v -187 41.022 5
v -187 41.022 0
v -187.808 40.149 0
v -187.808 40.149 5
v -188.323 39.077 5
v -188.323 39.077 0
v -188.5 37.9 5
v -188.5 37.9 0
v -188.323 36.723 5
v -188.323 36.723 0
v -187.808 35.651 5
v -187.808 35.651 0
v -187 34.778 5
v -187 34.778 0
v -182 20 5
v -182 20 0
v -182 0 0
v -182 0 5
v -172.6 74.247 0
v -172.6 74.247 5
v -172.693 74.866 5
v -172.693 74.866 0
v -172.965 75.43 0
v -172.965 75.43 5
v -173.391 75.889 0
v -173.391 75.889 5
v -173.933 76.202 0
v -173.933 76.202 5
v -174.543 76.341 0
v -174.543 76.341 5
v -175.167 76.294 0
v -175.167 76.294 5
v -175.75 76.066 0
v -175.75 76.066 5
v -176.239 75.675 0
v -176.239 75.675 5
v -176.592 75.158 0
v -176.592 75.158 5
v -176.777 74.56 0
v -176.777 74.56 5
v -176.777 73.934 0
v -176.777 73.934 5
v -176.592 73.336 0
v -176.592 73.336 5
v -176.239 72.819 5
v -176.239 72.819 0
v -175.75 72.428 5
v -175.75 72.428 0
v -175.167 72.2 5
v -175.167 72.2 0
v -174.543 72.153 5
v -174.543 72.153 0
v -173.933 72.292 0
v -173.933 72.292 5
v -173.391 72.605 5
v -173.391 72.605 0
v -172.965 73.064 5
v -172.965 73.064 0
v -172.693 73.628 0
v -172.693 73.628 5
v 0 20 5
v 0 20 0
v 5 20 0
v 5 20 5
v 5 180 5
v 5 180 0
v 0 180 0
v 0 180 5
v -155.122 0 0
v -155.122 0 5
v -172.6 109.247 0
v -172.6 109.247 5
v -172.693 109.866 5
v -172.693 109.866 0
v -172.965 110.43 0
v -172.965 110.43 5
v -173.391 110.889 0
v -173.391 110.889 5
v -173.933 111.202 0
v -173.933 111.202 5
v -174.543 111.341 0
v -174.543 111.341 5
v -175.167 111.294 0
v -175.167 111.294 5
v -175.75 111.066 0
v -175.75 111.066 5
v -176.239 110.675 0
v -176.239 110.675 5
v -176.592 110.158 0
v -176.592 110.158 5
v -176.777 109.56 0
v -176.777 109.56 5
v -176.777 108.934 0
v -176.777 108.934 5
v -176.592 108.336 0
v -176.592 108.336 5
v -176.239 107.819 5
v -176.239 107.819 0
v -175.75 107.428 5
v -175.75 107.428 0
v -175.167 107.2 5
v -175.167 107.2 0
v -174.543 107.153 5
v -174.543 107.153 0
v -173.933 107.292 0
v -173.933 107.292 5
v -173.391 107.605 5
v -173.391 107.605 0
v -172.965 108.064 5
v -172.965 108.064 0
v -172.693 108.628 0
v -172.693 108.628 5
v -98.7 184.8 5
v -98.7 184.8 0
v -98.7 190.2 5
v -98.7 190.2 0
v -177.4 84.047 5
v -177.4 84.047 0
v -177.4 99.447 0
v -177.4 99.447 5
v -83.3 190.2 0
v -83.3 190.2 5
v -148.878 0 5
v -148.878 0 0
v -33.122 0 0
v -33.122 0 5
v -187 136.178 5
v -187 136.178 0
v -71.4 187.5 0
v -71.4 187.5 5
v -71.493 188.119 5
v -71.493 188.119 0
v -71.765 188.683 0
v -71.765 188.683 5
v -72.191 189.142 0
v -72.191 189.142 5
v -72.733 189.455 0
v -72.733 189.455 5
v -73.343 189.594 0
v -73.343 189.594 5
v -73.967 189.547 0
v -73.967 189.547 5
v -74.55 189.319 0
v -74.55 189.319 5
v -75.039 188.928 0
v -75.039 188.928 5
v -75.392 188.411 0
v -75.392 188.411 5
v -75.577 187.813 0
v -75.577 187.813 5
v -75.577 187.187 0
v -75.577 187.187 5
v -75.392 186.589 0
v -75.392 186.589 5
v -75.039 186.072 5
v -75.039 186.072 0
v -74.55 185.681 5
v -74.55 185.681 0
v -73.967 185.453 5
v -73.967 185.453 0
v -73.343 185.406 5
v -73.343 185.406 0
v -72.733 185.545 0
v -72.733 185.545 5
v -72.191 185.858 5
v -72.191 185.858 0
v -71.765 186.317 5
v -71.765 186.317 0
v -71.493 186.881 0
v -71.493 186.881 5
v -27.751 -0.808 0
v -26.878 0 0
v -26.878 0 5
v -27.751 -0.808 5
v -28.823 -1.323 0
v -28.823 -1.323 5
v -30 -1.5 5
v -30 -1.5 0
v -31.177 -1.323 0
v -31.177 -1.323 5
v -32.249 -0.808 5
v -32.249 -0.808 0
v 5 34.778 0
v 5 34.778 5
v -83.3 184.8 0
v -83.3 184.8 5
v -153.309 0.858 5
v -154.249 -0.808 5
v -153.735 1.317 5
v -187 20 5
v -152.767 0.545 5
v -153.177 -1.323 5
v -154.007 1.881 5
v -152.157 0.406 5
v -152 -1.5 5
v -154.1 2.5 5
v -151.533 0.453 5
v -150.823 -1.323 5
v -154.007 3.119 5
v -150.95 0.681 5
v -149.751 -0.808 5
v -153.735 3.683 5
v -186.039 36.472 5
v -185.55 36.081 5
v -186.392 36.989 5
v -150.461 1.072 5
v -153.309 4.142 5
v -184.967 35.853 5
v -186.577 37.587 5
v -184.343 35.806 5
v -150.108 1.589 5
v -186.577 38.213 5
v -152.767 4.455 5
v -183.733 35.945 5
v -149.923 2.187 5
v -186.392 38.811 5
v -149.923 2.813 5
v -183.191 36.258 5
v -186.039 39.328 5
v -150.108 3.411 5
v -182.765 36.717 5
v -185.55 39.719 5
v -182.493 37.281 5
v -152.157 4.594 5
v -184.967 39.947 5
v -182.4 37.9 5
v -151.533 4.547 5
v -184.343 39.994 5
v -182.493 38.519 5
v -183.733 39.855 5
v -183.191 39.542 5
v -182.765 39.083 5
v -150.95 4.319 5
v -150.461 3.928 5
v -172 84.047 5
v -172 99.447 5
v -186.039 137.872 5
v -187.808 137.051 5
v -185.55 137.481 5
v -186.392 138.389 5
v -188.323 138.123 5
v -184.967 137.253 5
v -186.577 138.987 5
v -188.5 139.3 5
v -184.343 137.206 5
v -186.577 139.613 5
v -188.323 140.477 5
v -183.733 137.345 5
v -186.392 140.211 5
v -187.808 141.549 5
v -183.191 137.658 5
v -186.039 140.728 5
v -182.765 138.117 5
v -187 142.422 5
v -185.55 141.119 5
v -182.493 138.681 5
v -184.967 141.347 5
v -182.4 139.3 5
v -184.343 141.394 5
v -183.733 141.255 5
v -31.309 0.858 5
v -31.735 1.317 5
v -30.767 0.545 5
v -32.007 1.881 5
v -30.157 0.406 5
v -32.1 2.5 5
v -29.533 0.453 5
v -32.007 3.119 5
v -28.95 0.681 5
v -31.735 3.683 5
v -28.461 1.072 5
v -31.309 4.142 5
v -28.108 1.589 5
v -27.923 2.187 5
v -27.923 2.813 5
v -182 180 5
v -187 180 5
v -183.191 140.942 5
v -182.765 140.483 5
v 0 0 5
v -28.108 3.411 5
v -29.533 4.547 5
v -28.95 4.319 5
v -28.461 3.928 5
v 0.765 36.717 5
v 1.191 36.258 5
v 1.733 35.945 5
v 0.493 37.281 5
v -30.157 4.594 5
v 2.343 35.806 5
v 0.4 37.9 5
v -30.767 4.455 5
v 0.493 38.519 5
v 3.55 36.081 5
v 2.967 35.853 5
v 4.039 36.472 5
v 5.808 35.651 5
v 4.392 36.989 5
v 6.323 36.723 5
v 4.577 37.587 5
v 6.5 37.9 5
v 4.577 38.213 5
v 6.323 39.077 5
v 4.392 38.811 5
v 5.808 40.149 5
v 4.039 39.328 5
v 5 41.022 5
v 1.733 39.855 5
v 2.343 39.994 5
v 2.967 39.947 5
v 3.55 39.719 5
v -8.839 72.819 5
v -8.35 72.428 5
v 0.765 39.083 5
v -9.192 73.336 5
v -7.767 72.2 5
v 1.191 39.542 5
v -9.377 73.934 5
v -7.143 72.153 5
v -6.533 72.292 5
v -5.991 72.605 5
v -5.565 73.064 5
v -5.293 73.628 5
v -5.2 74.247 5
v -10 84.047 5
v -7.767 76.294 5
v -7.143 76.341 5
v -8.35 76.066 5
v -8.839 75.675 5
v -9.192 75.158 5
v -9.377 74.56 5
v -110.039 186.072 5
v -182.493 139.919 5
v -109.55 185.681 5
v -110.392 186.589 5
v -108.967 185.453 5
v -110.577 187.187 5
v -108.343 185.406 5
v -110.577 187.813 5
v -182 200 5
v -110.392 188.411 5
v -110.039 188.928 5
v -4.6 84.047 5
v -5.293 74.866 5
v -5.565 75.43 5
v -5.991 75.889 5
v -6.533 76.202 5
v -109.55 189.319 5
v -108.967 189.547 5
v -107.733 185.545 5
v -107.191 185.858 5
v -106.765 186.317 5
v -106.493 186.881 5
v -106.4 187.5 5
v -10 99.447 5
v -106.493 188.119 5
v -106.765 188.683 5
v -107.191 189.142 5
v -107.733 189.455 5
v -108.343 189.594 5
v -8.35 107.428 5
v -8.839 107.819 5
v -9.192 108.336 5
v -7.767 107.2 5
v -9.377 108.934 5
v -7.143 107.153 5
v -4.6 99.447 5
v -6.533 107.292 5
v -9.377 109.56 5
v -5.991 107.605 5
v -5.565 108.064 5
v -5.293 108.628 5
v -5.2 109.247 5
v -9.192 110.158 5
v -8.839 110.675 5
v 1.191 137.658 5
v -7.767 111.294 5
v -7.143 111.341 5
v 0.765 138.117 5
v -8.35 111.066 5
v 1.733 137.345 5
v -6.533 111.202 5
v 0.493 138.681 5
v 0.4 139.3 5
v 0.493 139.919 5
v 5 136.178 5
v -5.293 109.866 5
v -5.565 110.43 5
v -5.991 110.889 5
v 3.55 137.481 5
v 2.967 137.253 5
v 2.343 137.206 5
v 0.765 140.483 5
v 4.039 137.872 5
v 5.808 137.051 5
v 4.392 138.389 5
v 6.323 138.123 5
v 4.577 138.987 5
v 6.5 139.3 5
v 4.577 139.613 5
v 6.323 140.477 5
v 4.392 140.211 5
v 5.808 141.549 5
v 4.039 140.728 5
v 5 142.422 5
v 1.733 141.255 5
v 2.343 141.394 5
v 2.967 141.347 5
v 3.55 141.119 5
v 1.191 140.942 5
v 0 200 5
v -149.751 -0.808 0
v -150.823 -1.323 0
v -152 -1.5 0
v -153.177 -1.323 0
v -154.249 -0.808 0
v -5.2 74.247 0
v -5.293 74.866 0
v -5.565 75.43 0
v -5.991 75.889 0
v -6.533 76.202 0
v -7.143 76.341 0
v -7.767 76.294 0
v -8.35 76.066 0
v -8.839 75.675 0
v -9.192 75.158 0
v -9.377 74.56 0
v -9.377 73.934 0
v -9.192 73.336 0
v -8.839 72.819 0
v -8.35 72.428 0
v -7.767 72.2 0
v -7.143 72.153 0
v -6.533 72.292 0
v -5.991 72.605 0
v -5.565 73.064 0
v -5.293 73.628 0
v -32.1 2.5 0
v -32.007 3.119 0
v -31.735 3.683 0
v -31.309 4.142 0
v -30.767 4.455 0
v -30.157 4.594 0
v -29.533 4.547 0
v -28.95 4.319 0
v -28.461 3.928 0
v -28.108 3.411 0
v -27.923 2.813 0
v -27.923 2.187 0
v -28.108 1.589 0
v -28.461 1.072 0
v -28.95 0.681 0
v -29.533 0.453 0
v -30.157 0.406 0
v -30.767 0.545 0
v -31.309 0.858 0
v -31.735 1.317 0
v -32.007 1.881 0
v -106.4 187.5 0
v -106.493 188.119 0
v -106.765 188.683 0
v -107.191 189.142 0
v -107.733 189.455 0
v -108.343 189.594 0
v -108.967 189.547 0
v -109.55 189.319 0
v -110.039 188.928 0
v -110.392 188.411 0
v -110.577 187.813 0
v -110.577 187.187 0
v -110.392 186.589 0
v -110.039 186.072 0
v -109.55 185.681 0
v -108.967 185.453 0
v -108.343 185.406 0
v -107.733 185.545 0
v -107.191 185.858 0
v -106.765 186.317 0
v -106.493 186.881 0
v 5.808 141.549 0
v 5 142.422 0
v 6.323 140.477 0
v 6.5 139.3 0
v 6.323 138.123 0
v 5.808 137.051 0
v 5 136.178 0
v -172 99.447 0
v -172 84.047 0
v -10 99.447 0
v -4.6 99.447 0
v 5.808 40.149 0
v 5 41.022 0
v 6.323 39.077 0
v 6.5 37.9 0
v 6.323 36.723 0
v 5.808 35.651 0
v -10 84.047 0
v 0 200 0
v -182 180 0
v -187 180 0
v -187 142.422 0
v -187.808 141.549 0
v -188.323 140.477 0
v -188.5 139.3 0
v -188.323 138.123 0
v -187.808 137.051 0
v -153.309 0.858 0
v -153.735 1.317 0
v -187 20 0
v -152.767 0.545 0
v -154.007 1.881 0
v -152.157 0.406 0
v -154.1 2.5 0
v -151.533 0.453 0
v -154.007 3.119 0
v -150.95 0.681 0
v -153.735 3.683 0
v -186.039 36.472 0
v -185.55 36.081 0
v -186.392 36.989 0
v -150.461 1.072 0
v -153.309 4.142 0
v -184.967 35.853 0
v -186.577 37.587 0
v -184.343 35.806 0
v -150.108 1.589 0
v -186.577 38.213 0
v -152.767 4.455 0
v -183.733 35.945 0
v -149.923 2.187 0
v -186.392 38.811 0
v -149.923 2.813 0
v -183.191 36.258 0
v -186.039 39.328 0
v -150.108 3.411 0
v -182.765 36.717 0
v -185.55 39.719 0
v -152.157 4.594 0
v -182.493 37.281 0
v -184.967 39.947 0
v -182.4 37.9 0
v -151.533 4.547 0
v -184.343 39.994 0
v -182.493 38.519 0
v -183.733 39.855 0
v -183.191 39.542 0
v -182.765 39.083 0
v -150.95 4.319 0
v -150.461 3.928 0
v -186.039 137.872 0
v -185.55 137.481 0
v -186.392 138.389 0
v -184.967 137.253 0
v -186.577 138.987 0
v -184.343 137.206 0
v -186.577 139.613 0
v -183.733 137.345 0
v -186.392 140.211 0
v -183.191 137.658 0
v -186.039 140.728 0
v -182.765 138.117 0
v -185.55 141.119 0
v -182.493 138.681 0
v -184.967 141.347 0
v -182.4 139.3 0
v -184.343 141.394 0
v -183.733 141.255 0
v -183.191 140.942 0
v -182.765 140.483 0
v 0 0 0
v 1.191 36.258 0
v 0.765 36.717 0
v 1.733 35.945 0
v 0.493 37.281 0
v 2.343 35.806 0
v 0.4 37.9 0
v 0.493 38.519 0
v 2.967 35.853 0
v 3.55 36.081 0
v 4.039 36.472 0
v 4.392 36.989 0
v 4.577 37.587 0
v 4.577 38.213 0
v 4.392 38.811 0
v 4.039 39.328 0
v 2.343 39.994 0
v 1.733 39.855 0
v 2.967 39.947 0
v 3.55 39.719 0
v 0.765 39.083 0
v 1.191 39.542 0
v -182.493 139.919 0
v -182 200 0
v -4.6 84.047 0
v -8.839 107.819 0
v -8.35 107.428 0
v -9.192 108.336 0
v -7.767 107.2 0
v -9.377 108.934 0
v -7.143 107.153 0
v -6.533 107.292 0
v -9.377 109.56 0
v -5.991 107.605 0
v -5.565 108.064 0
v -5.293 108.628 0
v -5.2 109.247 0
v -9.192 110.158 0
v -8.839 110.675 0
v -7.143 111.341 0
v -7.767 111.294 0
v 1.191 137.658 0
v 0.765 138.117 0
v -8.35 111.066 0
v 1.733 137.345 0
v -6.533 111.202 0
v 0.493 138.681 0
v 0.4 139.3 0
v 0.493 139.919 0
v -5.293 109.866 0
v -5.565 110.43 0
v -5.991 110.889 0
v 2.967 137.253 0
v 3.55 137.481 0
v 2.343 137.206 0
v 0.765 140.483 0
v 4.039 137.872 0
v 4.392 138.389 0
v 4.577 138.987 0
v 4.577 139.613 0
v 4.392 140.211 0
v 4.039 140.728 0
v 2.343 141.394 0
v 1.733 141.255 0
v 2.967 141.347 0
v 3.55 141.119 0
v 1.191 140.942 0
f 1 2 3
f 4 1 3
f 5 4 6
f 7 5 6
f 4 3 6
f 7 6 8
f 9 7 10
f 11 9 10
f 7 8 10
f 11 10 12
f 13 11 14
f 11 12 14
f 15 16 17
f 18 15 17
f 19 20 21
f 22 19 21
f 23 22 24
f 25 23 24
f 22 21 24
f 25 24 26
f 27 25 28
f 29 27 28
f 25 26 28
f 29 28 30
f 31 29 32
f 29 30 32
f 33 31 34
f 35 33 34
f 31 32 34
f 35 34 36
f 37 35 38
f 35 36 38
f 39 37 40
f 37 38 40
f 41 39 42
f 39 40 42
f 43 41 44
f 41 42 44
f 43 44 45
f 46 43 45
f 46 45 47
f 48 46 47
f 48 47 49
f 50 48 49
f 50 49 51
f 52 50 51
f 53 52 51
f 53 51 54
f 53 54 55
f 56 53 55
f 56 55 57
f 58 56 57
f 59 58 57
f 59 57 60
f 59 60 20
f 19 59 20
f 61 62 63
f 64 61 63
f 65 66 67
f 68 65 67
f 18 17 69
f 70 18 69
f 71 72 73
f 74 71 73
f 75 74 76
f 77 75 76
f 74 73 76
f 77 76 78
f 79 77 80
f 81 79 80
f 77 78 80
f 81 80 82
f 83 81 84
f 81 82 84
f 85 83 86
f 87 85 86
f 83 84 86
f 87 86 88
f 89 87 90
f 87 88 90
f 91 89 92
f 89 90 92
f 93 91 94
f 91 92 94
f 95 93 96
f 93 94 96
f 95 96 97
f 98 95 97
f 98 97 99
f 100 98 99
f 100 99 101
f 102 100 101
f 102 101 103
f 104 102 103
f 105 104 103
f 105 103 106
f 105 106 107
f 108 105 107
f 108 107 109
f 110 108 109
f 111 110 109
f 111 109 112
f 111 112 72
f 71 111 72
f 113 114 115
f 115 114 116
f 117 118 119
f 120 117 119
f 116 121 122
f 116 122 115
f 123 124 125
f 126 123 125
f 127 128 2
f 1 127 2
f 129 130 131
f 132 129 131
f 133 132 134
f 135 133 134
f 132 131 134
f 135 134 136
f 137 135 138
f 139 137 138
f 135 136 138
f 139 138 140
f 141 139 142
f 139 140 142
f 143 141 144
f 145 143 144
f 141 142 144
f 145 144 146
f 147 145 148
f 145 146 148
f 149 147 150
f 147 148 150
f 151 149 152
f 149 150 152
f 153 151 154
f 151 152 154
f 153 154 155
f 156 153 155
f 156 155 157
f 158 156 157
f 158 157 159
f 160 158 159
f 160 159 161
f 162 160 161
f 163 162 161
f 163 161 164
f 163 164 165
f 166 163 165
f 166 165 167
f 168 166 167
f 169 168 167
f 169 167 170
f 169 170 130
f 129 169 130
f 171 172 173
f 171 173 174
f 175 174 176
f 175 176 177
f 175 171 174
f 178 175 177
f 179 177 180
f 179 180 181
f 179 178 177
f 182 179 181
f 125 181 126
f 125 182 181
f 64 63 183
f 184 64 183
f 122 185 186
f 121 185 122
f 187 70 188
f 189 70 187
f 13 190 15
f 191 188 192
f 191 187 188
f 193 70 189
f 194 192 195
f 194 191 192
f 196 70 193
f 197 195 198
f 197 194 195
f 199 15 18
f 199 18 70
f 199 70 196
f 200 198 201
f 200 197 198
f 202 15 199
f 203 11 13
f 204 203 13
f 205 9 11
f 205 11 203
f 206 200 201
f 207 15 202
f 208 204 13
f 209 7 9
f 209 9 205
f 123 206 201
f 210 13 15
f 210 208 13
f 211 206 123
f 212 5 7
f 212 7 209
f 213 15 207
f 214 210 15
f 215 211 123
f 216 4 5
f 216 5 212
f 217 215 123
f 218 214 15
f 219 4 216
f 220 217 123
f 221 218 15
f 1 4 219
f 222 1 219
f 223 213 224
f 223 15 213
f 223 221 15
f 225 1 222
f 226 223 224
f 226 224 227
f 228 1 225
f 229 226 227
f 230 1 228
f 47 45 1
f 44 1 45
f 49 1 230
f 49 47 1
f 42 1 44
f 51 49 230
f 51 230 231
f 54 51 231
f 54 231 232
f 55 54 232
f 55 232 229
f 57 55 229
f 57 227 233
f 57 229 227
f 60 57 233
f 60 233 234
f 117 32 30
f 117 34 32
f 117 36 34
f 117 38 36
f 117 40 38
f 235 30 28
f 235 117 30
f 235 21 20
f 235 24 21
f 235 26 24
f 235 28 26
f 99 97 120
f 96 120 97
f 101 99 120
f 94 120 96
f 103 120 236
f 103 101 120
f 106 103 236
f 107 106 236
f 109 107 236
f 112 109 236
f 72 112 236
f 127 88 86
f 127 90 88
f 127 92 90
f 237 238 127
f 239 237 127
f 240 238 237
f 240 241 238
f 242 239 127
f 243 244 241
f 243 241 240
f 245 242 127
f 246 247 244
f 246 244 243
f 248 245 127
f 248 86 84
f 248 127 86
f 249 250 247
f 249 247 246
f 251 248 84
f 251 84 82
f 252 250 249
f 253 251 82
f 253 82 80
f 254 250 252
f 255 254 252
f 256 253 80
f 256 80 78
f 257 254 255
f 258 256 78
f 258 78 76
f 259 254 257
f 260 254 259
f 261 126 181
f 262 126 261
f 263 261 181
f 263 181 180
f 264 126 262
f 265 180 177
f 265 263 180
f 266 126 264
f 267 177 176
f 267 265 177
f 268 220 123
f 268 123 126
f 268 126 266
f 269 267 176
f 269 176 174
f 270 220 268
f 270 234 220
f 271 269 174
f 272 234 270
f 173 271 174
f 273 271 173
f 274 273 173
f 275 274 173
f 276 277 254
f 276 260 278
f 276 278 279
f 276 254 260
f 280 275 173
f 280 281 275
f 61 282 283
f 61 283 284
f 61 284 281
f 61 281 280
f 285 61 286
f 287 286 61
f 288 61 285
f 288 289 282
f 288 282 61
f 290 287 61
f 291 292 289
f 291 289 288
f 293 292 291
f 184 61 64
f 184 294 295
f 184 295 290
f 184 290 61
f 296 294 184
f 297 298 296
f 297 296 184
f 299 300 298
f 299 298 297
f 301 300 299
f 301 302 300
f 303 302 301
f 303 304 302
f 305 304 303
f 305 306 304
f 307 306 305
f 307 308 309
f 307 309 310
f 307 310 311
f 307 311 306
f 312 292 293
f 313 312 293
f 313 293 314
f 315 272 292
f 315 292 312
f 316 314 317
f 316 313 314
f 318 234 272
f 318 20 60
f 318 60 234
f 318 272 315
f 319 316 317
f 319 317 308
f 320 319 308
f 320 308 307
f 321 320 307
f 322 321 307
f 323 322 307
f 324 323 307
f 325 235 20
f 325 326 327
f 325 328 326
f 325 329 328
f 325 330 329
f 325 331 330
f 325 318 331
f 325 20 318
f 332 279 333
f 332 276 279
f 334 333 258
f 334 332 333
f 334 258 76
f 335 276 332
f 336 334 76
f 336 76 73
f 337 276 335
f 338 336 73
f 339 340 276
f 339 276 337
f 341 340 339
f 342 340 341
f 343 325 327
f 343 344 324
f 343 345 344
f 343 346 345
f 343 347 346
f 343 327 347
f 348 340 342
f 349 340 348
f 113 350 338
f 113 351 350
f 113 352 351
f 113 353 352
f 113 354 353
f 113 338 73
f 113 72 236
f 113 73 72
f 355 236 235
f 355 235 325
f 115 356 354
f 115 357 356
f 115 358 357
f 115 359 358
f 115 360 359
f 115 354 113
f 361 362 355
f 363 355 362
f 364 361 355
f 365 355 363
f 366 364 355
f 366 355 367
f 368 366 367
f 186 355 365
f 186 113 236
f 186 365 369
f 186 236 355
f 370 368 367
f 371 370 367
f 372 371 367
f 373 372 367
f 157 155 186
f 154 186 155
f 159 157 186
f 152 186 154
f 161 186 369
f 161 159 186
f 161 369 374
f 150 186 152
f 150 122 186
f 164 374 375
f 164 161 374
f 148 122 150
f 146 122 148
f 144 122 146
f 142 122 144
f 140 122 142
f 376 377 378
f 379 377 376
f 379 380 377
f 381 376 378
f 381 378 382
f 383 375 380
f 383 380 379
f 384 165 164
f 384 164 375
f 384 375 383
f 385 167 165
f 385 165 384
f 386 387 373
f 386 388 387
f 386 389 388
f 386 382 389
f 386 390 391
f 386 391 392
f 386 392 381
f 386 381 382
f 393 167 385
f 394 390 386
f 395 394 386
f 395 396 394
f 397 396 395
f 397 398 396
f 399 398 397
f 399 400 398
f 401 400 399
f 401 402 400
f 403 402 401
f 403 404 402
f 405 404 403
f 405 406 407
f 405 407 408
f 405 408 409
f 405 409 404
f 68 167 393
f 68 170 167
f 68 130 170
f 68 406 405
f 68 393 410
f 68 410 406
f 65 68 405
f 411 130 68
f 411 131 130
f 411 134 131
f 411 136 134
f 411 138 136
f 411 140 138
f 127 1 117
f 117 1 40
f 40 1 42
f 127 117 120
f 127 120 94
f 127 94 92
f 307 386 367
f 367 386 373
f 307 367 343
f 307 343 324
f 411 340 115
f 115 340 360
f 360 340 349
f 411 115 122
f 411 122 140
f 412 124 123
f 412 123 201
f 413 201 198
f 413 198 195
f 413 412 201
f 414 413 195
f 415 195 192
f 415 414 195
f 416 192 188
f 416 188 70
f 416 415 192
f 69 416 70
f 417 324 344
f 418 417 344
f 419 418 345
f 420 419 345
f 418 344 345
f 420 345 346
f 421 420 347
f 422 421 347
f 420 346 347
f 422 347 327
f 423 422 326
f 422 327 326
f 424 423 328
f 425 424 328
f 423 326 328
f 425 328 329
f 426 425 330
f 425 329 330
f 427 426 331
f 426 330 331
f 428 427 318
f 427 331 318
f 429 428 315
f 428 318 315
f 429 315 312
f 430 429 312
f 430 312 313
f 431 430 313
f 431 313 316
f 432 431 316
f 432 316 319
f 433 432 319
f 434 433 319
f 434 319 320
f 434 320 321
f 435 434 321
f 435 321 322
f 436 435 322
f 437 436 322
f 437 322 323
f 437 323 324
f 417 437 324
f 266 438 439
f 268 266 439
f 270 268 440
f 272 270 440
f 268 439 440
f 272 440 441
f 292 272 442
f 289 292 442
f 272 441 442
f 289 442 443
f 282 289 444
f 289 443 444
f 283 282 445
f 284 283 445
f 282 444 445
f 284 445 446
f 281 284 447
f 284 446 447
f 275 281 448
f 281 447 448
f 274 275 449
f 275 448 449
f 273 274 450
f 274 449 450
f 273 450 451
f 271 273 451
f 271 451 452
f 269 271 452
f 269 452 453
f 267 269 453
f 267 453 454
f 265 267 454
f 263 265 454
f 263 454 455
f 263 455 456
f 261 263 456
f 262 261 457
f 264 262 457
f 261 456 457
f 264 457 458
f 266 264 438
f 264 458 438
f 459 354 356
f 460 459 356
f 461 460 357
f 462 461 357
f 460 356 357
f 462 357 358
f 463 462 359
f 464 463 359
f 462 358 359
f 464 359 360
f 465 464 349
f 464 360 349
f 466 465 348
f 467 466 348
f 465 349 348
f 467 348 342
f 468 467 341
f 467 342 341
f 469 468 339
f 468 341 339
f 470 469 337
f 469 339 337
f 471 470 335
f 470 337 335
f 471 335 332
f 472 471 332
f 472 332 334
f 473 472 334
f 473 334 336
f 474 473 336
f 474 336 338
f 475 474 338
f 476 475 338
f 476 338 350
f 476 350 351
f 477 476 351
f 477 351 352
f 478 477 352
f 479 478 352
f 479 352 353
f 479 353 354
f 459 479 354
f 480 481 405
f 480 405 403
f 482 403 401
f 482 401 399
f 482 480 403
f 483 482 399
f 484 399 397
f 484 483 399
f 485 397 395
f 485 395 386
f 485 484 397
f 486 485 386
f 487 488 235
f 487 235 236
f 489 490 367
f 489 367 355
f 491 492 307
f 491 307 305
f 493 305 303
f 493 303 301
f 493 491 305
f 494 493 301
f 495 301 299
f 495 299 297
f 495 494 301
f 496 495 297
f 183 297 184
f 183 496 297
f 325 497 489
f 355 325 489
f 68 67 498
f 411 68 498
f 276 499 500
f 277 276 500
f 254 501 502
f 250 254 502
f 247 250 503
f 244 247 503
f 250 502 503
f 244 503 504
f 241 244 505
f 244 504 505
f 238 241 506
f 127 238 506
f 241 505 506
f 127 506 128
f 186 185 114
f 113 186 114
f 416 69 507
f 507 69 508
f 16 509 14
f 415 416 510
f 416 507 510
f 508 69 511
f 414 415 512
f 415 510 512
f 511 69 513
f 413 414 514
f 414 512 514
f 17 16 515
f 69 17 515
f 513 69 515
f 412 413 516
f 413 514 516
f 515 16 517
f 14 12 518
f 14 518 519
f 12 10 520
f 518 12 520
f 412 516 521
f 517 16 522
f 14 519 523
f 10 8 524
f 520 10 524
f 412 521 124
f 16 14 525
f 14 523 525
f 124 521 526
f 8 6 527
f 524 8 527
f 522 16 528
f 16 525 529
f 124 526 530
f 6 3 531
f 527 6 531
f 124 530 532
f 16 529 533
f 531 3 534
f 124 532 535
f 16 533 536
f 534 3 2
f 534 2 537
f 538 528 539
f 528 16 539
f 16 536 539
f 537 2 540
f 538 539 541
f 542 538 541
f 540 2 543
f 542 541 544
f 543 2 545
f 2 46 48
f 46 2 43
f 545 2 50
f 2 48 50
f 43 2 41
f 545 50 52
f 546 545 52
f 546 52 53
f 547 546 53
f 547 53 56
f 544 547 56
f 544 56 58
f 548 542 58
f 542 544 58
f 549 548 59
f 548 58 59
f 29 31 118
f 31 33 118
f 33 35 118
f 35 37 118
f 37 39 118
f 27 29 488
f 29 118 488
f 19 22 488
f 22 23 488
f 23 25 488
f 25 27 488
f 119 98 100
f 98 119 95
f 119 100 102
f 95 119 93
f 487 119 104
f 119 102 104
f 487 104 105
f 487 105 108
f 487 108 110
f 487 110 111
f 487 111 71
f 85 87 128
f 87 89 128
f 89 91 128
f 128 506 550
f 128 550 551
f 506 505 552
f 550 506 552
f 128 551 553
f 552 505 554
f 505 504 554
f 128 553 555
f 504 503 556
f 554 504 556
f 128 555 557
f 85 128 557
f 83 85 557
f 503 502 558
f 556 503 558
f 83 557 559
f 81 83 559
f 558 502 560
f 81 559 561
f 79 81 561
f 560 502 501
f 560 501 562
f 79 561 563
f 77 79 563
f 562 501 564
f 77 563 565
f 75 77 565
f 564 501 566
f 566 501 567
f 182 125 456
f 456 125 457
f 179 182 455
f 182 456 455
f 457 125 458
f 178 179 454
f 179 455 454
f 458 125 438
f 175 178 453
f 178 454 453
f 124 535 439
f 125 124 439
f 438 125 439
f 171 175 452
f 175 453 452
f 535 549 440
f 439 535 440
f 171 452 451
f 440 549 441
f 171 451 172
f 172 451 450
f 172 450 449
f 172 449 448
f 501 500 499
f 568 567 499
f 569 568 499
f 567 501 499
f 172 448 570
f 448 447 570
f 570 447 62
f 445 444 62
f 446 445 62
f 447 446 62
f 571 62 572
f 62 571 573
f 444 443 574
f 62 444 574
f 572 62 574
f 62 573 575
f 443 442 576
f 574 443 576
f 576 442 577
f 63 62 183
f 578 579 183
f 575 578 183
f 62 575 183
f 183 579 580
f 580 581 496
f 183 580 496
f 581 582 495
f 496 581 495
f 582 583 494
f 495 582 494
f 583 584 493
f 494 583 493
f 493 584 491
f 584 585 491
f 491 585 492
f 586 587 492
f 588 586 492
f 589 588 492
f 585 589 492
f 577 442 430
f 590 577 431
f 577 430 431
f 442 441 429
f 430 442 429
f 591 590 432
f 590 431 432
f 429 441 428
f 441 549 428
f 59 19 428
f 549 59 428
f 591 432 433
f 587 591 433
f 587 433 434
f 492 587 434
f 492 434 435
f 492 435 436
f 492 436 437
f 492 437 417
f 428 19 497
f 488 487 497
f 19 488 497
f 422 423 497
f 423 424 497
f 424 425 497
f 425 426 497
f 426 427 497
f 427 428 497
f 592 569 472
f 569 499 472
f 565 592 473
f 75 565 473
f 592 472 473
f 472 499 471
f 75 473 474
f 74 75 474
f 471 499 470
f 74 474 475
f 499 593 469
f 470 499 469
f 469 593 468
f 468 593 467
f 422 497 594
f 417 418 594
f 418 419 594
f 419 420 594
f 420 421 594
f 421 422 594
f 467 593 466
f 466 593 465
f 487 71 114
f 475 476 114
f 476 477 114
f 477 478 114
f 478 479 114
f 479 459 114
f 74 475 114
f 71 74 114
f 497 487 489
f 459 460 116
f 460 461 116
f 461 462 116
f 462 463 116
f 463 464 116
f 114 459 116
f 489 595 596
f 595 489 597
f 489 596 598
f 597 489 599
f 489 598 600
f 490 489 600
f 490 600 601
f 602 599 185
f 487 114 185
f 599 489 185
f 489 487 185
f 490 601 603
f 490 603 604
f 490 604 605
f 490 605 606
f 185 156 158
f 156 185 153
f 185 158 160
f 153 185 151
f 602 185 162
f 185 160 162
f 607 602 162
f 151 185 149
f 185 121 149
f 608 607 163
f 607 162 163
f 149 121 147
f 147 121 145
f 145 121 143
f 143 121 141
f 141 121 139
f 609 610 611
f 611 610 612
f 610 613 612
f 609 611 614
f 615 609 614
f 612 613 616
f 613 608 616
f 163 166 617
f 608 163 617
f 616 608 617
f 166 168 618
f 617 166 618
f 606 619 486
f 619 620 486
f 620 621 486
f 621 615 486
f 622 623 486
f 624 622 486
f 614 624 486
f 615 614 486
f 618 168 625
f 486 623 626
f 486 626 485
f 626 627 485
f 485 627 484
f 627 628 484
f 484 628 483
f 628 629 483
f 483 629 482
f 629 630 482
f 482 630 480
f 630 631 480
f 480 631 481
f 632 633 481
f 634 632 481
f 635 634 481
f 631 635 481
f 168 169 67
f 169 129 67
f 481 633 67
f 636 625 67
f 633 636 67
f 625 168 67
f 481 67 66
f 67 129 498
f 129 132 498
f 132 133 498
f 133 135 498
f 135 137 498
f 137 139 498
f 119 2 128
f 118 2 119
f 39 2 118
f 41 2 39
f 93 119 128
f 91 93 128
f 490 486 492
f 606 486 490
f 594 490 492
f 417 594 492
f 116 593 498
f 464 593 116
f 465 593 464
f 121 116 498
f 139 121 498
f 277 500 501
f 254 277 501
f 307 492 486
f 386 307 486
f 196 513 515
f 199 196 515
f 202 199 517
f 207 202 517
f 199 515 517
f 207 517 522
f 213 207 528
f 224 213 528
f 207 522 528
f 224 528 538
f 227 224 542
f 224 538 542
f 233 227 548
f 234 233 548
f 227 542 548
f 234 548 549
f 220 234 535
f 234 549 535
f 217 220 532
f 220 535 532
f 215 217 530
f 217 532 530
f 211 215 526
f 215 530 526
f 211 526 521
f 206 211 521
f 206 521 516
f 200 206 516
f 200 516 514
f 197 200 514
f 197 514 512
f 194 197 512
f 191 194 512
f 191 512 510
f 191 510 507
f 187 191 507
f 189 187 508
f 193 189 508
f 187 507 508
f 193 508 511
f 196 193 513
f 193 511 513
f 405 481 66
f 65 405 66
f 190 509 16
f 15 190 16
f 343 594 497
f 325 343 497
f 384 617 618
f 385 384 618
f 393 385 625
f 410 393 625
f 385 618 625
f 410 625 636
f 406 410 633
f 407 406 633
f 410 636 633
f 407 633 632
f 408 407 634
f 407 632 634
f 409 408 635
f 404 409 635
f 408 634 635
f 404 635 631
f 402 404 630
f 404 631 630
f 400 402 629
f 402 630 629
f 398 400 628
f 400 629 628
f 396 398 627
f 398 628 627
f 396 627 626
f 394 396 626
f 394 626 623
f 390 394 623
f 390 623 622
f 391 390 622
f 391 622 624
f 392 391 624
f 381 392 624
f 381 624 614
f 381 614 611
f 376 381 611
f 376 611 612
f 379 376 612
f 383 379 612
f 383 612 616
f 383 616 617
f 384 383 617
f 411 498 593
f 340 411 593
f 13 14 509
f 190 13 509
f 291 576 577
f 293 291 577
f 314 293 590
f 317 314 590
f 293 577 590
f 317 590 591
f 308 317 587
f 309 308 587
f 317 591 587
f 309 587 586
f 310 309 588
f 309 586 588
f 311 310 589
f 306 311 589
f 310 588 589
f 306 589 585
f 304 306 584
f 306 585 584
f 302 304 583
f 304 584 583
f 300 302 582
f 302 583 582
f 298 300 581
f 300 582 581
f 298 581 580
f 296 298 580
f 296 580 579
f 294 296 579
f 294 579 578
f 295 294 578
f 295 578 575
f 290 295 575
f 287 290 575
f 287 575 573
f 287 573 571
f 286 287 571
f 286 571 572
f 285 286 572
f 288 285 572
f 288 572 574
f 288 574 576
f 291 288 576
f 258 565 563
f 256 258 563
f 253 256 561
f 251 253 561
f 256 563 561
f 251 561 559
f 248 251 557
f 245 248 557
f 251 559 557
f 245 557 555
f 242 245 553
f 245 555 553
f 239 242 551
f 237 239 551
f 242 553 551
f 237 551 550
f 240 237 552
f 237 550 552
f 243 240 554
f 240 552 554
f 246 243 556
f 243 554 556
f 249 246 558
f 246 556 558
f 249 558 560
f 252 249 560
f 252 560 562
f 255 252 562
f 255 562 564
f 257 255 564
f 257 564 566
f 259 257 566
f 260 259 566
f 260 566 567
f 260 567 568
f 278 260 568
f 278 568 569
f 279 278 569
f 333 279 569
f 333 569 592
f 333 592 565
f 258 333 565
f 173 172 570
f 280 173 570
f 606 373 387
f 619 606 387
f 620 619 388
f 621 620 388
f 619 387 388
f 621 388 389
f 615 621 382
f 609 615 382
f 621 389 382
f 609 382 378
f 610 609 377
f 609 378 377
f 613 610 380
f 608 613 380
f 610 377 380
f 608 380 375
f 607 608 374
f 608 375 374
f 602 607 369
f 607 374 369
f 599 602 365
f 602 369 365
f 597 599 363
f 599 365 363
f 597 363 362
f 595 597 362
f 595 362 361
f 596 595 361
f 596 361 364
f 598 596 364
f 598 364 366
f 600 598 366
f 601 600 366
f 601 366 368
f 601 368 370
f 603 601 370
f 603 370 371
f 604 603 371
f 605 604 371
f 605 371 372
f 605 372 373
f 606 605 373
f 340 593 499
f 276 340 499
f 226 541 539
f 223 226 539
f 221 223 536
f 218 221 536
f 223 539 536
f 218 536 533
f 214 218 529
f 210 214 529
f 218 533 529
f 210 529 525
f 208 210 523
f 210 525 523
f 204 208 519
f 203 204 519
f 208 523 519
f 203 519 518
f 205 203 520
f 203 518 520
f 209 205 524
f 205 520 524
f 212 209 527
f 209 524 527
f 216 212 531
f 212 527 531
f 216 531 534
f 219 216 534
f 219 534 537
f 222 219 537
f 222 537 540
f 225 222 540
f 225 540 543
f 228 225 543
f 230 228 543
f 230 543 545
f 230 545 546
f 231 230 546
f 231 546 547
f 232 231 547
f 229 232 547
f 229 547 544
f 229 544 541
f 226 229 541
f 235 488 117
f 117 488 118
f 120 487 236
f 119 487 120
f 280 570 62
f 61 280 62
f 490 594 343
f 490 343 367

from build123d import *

# Parameters (mm, degrees)
BOSS_EXTRUDE1_DEPTH = 5
SKETCH2_R           = 2.1
CUT_EXTRUDE1_DEPTH  = 10
BOSS_EXTRUDE2_DEPTH = 5
BOSS_EXTRUDE3_DEPTH = 5
SKETCH5_R           = 2.1
CUT_EXTRUDE2_DEPTH  = 5
BOSS_EXTRUDE4_DEPTH = 5
SKETCH10_W          = 5.4
SKETCH10_H          = 15.4
SKETCH10_W_2        = 15.4
SKETCH10_H_2        = 5.4
SKETCH10_W_3        = 15
SKETCH10_H_3        = 5
CUT_EXTRUDE7_DEPTH  = 10
SKETCH11_W          = 15
SKETCH11_H          = 5
CUT_EXTRUDE8_DEPTH  = 10
SKETCH12_R          = 2.1
CUT_EXTRUDE9_DEPTH  = 10


with BuildPart() as part:
    # Sketch1 → Boss-Extrude1 (new body)
    with BuildSketch(Plane.XY):
        Polygon((-182, 200), (-182, 180), (-187, 180), (-187, 20), (-182, 20), (-182, 0), (0, 0), (0, 20), (5, 20), (5, 180), (0, 180), (0, 200), align=None)
    extrude(amount=BOSS_EXTRUDE1_DEPTH)

    # Sketch2 → Cut-Extrude1 (cut)
    with BuildSketch(Plane(origin=(0, 0, 0), x_dir=(-1, 0, 0), z_dir=(0, 0, -1))):
        with Locations((-2.5, 139.3)):
            Circle(SKETCH2_R)
        with Locations((-2.5, 37.9)):
            Circle(SKETCH2_R)
        with Locations(Location((184.5, 37.9, 0), (0, 0, 180))):
            Circle(SKETCH2_R)
        with Locations(Location((184.5, 139.3, 0), (0, 0, 180))):
            Circle(SKETCH2_R)
    extrude(amount=-CUT_EXTRUDE1_DEPTH, mode=Mode.SUBTRACT)

    # Sketch3 → Boss-Extrude2 (add)
    with BuildSketch(Plane(origin=(0, 0, 0), x_dir=(-1, 0, 0), z_dir=(0, 0, -1))):
        with BuildLine():
            Line((-5, 136.177501001), (-5, 142.422498999))
            ThreePointArc((-5, 142.422498999), (-6.5, 139.3), (-5, 136.177501001))
        make_face()
    boss_extrude2 = extrude(amount=-BOSS_EXTRUDE2_DEPTH)

    # Sketch4 → Boss-Extrude3 (add)
    with BuildSketch(Plane(origin=(0, 0, 0), x_dir=(-1, 0, 0), z_dir=(0, 0, -1))):
        with BuildLine():
            Line((-5, 34.777501001), (-5, 41.022498999))
            ThreePointArc((-5, 41.022498999), (-6.5, 37.9), (-5, 34.777501001))
        make_face()
    boss_extrude3 = extrude(amount=-BOSS_EXTRUDE3_DEPTH)

    # Mirror1: Boss-Extrude2, Boss-Extrude3 across plane
    add(boss_extrude2.mirror(Plane.ZY.offset(91)))
    add(boss_extrude3.mirror(Plane.ZY.offset(91)))

    # Sketch5 → Cut-Extrude2 (cut)
    with BuildSketch(Plane(origin=(0, 0, 0), x_dir=(-1, 0, 0), z_dir=(0, 0, -1))):
        with Locations((30, 2.5)):
            Circle(SKETCH5_R)
        with Locations((152, 2.5)):
            Circle(SKETCH5_R)
    extrude(amount=-CUT_EXTRUDE2_DEPTH, mode=Mode.SUBTRACT)

    # Sketch6 → Boss-Extrude4 (add)
    with BuildSketch(Plane(origin=(0, 0, 0), x_dir=(-1, 0, 0), z_dir=(0, 0, -1))):
        with BuildLine():
            Line((155.122498999, 0), (148.877501001, 0))
            ThreePointArc((148.877501001, 0), (152, -1.5), (155.122498999, 0))
        make_face()
        with BuildLine():
            Line((33.122498999, 0), (26.877501001, 0))
            ThreePointArc((26.877501001, 0), (30, -1.5), (33.122498999, 0))
        make_face()
    extrude(amount=-BOSS_EXTRUDE4_DEPTH)

    # Sketch10 → Cut-Extrude7 (cut)
    # profile 1 of 4: a face of its own
    with BuildSketch(Plane(origin=(0, 0, 0), x_dir=(-1, 0, 0), z_dir=(0, 0, -1))):
        with Locations((7.3, 91.747126042)):
            Rectangle(SKETCH10_W, SKETCH10_H)
    # profile 2 of 4: a face of its own
    with BuildSketch(Plane(origin=(0, 0, 0), x_dir=(-1, 0, 0), z_dir=(0, 0, -1))):
        with Locations((174.7, 91.747126042)):
            Rectangle(SKETCH10_W, SKETCH10_H)
    # profile 3 of 4: a face of its own
    with BuildSketch(Plane(origin=(0, 0, 0), x_dir=(-1, 0, 0), z_dir=(0, 0, -1))):
        with Locations((91, -4.005747915)):
            Rectangle(SKETCH10_W_2, SKETCH10_H_2)
        with Locations((91, -4.005747915)):
            Rectangle(SKETCH10_W_3, SKETCH10_H_3, mode=Mode.SUBTRACT)
    # profile 4 of 4: a face of its own
    with BuildSketch(Plane(origin=(0, 0, 0), x_dir=(-1, 0, 0), z_dir=(0, 0, -1))):
        with Locations((91, 187.5)):
            Rectangle(SKETCH10_W_2, SKETCH10_H_2)
        with Locations((91, 187.5)):
            Rectangle(SKETCH10_W_3, SKETCH10_H_3, mode=Mode.SUBTRACT)
    extrude(amount=-CUT_EXTRUDE7_DEPTH, mode=Mode.SUBTRACT)


with BuildPart() as cut_extrude7_piece_1:
    # of the separate pieces the step leaves, piece 1, a body of its own (cut_extrude7_pieces)
    add(part.part.solids().sort_by_distance((-182, 200, 0))[0])

    # Sketch12 → Cut-Extrude9 (cut)
    with BuildSketch(Plane.XY.offset(5)):
        with Locations((-108.5, 187.5)):
            Circle(SKETCH12_R)
        with Locations((-73.5, 187.5)):
            Circle(SKETCH12_R)
        with Locations((-73.5, -4.005747915)):
            Circle(SKETCH12_R)
        with Locations((-108.5, -4.005747915)):
            Circle(SKETCH12_R)
        with Locations((-174.7, 109.247126042)):
            Circle(SKETCH12_R)
        with Locations((-174.7, 74.247126042)):
            Circle(SKETCH12_R)
        with Locations((-7.3, 74.247126042)):
            Circle(SKETCH12_R)
        with Locations((-7.3, 109.247126042)):
            Circle(SKETCH12_R)
    extrude(amount=-CUT_EXTRUDE9_DEPTH, mode=Mode.SUBTRACT)


with BuildPart() as cut_extrude7_piece_2:
    # of the separate pieces the step leaves, piece 2, a body of its own (cut_extrude7_pieces)
    add(part.part.solids().sort_by_distance((-98.5, 185, 0))[0])

    # Sketch11 → Cut-Extrude8 (cut)
    with BuildSketch(Plane.XY.offset(5)):
        with Locations((-91, 12.499999997)):
            Rectangle(SKETCH11_W, SKETCH11_H)
        with Locations((-91, 187.5)):
            Rectangle(SKETCH11_W, SKETCH11_H)
    extrude(amount=-CUT_EXTRUDE8_DEPTH, mode=Mode.SUBTRACT)


solid = cut_extrude7_piece_1.part
